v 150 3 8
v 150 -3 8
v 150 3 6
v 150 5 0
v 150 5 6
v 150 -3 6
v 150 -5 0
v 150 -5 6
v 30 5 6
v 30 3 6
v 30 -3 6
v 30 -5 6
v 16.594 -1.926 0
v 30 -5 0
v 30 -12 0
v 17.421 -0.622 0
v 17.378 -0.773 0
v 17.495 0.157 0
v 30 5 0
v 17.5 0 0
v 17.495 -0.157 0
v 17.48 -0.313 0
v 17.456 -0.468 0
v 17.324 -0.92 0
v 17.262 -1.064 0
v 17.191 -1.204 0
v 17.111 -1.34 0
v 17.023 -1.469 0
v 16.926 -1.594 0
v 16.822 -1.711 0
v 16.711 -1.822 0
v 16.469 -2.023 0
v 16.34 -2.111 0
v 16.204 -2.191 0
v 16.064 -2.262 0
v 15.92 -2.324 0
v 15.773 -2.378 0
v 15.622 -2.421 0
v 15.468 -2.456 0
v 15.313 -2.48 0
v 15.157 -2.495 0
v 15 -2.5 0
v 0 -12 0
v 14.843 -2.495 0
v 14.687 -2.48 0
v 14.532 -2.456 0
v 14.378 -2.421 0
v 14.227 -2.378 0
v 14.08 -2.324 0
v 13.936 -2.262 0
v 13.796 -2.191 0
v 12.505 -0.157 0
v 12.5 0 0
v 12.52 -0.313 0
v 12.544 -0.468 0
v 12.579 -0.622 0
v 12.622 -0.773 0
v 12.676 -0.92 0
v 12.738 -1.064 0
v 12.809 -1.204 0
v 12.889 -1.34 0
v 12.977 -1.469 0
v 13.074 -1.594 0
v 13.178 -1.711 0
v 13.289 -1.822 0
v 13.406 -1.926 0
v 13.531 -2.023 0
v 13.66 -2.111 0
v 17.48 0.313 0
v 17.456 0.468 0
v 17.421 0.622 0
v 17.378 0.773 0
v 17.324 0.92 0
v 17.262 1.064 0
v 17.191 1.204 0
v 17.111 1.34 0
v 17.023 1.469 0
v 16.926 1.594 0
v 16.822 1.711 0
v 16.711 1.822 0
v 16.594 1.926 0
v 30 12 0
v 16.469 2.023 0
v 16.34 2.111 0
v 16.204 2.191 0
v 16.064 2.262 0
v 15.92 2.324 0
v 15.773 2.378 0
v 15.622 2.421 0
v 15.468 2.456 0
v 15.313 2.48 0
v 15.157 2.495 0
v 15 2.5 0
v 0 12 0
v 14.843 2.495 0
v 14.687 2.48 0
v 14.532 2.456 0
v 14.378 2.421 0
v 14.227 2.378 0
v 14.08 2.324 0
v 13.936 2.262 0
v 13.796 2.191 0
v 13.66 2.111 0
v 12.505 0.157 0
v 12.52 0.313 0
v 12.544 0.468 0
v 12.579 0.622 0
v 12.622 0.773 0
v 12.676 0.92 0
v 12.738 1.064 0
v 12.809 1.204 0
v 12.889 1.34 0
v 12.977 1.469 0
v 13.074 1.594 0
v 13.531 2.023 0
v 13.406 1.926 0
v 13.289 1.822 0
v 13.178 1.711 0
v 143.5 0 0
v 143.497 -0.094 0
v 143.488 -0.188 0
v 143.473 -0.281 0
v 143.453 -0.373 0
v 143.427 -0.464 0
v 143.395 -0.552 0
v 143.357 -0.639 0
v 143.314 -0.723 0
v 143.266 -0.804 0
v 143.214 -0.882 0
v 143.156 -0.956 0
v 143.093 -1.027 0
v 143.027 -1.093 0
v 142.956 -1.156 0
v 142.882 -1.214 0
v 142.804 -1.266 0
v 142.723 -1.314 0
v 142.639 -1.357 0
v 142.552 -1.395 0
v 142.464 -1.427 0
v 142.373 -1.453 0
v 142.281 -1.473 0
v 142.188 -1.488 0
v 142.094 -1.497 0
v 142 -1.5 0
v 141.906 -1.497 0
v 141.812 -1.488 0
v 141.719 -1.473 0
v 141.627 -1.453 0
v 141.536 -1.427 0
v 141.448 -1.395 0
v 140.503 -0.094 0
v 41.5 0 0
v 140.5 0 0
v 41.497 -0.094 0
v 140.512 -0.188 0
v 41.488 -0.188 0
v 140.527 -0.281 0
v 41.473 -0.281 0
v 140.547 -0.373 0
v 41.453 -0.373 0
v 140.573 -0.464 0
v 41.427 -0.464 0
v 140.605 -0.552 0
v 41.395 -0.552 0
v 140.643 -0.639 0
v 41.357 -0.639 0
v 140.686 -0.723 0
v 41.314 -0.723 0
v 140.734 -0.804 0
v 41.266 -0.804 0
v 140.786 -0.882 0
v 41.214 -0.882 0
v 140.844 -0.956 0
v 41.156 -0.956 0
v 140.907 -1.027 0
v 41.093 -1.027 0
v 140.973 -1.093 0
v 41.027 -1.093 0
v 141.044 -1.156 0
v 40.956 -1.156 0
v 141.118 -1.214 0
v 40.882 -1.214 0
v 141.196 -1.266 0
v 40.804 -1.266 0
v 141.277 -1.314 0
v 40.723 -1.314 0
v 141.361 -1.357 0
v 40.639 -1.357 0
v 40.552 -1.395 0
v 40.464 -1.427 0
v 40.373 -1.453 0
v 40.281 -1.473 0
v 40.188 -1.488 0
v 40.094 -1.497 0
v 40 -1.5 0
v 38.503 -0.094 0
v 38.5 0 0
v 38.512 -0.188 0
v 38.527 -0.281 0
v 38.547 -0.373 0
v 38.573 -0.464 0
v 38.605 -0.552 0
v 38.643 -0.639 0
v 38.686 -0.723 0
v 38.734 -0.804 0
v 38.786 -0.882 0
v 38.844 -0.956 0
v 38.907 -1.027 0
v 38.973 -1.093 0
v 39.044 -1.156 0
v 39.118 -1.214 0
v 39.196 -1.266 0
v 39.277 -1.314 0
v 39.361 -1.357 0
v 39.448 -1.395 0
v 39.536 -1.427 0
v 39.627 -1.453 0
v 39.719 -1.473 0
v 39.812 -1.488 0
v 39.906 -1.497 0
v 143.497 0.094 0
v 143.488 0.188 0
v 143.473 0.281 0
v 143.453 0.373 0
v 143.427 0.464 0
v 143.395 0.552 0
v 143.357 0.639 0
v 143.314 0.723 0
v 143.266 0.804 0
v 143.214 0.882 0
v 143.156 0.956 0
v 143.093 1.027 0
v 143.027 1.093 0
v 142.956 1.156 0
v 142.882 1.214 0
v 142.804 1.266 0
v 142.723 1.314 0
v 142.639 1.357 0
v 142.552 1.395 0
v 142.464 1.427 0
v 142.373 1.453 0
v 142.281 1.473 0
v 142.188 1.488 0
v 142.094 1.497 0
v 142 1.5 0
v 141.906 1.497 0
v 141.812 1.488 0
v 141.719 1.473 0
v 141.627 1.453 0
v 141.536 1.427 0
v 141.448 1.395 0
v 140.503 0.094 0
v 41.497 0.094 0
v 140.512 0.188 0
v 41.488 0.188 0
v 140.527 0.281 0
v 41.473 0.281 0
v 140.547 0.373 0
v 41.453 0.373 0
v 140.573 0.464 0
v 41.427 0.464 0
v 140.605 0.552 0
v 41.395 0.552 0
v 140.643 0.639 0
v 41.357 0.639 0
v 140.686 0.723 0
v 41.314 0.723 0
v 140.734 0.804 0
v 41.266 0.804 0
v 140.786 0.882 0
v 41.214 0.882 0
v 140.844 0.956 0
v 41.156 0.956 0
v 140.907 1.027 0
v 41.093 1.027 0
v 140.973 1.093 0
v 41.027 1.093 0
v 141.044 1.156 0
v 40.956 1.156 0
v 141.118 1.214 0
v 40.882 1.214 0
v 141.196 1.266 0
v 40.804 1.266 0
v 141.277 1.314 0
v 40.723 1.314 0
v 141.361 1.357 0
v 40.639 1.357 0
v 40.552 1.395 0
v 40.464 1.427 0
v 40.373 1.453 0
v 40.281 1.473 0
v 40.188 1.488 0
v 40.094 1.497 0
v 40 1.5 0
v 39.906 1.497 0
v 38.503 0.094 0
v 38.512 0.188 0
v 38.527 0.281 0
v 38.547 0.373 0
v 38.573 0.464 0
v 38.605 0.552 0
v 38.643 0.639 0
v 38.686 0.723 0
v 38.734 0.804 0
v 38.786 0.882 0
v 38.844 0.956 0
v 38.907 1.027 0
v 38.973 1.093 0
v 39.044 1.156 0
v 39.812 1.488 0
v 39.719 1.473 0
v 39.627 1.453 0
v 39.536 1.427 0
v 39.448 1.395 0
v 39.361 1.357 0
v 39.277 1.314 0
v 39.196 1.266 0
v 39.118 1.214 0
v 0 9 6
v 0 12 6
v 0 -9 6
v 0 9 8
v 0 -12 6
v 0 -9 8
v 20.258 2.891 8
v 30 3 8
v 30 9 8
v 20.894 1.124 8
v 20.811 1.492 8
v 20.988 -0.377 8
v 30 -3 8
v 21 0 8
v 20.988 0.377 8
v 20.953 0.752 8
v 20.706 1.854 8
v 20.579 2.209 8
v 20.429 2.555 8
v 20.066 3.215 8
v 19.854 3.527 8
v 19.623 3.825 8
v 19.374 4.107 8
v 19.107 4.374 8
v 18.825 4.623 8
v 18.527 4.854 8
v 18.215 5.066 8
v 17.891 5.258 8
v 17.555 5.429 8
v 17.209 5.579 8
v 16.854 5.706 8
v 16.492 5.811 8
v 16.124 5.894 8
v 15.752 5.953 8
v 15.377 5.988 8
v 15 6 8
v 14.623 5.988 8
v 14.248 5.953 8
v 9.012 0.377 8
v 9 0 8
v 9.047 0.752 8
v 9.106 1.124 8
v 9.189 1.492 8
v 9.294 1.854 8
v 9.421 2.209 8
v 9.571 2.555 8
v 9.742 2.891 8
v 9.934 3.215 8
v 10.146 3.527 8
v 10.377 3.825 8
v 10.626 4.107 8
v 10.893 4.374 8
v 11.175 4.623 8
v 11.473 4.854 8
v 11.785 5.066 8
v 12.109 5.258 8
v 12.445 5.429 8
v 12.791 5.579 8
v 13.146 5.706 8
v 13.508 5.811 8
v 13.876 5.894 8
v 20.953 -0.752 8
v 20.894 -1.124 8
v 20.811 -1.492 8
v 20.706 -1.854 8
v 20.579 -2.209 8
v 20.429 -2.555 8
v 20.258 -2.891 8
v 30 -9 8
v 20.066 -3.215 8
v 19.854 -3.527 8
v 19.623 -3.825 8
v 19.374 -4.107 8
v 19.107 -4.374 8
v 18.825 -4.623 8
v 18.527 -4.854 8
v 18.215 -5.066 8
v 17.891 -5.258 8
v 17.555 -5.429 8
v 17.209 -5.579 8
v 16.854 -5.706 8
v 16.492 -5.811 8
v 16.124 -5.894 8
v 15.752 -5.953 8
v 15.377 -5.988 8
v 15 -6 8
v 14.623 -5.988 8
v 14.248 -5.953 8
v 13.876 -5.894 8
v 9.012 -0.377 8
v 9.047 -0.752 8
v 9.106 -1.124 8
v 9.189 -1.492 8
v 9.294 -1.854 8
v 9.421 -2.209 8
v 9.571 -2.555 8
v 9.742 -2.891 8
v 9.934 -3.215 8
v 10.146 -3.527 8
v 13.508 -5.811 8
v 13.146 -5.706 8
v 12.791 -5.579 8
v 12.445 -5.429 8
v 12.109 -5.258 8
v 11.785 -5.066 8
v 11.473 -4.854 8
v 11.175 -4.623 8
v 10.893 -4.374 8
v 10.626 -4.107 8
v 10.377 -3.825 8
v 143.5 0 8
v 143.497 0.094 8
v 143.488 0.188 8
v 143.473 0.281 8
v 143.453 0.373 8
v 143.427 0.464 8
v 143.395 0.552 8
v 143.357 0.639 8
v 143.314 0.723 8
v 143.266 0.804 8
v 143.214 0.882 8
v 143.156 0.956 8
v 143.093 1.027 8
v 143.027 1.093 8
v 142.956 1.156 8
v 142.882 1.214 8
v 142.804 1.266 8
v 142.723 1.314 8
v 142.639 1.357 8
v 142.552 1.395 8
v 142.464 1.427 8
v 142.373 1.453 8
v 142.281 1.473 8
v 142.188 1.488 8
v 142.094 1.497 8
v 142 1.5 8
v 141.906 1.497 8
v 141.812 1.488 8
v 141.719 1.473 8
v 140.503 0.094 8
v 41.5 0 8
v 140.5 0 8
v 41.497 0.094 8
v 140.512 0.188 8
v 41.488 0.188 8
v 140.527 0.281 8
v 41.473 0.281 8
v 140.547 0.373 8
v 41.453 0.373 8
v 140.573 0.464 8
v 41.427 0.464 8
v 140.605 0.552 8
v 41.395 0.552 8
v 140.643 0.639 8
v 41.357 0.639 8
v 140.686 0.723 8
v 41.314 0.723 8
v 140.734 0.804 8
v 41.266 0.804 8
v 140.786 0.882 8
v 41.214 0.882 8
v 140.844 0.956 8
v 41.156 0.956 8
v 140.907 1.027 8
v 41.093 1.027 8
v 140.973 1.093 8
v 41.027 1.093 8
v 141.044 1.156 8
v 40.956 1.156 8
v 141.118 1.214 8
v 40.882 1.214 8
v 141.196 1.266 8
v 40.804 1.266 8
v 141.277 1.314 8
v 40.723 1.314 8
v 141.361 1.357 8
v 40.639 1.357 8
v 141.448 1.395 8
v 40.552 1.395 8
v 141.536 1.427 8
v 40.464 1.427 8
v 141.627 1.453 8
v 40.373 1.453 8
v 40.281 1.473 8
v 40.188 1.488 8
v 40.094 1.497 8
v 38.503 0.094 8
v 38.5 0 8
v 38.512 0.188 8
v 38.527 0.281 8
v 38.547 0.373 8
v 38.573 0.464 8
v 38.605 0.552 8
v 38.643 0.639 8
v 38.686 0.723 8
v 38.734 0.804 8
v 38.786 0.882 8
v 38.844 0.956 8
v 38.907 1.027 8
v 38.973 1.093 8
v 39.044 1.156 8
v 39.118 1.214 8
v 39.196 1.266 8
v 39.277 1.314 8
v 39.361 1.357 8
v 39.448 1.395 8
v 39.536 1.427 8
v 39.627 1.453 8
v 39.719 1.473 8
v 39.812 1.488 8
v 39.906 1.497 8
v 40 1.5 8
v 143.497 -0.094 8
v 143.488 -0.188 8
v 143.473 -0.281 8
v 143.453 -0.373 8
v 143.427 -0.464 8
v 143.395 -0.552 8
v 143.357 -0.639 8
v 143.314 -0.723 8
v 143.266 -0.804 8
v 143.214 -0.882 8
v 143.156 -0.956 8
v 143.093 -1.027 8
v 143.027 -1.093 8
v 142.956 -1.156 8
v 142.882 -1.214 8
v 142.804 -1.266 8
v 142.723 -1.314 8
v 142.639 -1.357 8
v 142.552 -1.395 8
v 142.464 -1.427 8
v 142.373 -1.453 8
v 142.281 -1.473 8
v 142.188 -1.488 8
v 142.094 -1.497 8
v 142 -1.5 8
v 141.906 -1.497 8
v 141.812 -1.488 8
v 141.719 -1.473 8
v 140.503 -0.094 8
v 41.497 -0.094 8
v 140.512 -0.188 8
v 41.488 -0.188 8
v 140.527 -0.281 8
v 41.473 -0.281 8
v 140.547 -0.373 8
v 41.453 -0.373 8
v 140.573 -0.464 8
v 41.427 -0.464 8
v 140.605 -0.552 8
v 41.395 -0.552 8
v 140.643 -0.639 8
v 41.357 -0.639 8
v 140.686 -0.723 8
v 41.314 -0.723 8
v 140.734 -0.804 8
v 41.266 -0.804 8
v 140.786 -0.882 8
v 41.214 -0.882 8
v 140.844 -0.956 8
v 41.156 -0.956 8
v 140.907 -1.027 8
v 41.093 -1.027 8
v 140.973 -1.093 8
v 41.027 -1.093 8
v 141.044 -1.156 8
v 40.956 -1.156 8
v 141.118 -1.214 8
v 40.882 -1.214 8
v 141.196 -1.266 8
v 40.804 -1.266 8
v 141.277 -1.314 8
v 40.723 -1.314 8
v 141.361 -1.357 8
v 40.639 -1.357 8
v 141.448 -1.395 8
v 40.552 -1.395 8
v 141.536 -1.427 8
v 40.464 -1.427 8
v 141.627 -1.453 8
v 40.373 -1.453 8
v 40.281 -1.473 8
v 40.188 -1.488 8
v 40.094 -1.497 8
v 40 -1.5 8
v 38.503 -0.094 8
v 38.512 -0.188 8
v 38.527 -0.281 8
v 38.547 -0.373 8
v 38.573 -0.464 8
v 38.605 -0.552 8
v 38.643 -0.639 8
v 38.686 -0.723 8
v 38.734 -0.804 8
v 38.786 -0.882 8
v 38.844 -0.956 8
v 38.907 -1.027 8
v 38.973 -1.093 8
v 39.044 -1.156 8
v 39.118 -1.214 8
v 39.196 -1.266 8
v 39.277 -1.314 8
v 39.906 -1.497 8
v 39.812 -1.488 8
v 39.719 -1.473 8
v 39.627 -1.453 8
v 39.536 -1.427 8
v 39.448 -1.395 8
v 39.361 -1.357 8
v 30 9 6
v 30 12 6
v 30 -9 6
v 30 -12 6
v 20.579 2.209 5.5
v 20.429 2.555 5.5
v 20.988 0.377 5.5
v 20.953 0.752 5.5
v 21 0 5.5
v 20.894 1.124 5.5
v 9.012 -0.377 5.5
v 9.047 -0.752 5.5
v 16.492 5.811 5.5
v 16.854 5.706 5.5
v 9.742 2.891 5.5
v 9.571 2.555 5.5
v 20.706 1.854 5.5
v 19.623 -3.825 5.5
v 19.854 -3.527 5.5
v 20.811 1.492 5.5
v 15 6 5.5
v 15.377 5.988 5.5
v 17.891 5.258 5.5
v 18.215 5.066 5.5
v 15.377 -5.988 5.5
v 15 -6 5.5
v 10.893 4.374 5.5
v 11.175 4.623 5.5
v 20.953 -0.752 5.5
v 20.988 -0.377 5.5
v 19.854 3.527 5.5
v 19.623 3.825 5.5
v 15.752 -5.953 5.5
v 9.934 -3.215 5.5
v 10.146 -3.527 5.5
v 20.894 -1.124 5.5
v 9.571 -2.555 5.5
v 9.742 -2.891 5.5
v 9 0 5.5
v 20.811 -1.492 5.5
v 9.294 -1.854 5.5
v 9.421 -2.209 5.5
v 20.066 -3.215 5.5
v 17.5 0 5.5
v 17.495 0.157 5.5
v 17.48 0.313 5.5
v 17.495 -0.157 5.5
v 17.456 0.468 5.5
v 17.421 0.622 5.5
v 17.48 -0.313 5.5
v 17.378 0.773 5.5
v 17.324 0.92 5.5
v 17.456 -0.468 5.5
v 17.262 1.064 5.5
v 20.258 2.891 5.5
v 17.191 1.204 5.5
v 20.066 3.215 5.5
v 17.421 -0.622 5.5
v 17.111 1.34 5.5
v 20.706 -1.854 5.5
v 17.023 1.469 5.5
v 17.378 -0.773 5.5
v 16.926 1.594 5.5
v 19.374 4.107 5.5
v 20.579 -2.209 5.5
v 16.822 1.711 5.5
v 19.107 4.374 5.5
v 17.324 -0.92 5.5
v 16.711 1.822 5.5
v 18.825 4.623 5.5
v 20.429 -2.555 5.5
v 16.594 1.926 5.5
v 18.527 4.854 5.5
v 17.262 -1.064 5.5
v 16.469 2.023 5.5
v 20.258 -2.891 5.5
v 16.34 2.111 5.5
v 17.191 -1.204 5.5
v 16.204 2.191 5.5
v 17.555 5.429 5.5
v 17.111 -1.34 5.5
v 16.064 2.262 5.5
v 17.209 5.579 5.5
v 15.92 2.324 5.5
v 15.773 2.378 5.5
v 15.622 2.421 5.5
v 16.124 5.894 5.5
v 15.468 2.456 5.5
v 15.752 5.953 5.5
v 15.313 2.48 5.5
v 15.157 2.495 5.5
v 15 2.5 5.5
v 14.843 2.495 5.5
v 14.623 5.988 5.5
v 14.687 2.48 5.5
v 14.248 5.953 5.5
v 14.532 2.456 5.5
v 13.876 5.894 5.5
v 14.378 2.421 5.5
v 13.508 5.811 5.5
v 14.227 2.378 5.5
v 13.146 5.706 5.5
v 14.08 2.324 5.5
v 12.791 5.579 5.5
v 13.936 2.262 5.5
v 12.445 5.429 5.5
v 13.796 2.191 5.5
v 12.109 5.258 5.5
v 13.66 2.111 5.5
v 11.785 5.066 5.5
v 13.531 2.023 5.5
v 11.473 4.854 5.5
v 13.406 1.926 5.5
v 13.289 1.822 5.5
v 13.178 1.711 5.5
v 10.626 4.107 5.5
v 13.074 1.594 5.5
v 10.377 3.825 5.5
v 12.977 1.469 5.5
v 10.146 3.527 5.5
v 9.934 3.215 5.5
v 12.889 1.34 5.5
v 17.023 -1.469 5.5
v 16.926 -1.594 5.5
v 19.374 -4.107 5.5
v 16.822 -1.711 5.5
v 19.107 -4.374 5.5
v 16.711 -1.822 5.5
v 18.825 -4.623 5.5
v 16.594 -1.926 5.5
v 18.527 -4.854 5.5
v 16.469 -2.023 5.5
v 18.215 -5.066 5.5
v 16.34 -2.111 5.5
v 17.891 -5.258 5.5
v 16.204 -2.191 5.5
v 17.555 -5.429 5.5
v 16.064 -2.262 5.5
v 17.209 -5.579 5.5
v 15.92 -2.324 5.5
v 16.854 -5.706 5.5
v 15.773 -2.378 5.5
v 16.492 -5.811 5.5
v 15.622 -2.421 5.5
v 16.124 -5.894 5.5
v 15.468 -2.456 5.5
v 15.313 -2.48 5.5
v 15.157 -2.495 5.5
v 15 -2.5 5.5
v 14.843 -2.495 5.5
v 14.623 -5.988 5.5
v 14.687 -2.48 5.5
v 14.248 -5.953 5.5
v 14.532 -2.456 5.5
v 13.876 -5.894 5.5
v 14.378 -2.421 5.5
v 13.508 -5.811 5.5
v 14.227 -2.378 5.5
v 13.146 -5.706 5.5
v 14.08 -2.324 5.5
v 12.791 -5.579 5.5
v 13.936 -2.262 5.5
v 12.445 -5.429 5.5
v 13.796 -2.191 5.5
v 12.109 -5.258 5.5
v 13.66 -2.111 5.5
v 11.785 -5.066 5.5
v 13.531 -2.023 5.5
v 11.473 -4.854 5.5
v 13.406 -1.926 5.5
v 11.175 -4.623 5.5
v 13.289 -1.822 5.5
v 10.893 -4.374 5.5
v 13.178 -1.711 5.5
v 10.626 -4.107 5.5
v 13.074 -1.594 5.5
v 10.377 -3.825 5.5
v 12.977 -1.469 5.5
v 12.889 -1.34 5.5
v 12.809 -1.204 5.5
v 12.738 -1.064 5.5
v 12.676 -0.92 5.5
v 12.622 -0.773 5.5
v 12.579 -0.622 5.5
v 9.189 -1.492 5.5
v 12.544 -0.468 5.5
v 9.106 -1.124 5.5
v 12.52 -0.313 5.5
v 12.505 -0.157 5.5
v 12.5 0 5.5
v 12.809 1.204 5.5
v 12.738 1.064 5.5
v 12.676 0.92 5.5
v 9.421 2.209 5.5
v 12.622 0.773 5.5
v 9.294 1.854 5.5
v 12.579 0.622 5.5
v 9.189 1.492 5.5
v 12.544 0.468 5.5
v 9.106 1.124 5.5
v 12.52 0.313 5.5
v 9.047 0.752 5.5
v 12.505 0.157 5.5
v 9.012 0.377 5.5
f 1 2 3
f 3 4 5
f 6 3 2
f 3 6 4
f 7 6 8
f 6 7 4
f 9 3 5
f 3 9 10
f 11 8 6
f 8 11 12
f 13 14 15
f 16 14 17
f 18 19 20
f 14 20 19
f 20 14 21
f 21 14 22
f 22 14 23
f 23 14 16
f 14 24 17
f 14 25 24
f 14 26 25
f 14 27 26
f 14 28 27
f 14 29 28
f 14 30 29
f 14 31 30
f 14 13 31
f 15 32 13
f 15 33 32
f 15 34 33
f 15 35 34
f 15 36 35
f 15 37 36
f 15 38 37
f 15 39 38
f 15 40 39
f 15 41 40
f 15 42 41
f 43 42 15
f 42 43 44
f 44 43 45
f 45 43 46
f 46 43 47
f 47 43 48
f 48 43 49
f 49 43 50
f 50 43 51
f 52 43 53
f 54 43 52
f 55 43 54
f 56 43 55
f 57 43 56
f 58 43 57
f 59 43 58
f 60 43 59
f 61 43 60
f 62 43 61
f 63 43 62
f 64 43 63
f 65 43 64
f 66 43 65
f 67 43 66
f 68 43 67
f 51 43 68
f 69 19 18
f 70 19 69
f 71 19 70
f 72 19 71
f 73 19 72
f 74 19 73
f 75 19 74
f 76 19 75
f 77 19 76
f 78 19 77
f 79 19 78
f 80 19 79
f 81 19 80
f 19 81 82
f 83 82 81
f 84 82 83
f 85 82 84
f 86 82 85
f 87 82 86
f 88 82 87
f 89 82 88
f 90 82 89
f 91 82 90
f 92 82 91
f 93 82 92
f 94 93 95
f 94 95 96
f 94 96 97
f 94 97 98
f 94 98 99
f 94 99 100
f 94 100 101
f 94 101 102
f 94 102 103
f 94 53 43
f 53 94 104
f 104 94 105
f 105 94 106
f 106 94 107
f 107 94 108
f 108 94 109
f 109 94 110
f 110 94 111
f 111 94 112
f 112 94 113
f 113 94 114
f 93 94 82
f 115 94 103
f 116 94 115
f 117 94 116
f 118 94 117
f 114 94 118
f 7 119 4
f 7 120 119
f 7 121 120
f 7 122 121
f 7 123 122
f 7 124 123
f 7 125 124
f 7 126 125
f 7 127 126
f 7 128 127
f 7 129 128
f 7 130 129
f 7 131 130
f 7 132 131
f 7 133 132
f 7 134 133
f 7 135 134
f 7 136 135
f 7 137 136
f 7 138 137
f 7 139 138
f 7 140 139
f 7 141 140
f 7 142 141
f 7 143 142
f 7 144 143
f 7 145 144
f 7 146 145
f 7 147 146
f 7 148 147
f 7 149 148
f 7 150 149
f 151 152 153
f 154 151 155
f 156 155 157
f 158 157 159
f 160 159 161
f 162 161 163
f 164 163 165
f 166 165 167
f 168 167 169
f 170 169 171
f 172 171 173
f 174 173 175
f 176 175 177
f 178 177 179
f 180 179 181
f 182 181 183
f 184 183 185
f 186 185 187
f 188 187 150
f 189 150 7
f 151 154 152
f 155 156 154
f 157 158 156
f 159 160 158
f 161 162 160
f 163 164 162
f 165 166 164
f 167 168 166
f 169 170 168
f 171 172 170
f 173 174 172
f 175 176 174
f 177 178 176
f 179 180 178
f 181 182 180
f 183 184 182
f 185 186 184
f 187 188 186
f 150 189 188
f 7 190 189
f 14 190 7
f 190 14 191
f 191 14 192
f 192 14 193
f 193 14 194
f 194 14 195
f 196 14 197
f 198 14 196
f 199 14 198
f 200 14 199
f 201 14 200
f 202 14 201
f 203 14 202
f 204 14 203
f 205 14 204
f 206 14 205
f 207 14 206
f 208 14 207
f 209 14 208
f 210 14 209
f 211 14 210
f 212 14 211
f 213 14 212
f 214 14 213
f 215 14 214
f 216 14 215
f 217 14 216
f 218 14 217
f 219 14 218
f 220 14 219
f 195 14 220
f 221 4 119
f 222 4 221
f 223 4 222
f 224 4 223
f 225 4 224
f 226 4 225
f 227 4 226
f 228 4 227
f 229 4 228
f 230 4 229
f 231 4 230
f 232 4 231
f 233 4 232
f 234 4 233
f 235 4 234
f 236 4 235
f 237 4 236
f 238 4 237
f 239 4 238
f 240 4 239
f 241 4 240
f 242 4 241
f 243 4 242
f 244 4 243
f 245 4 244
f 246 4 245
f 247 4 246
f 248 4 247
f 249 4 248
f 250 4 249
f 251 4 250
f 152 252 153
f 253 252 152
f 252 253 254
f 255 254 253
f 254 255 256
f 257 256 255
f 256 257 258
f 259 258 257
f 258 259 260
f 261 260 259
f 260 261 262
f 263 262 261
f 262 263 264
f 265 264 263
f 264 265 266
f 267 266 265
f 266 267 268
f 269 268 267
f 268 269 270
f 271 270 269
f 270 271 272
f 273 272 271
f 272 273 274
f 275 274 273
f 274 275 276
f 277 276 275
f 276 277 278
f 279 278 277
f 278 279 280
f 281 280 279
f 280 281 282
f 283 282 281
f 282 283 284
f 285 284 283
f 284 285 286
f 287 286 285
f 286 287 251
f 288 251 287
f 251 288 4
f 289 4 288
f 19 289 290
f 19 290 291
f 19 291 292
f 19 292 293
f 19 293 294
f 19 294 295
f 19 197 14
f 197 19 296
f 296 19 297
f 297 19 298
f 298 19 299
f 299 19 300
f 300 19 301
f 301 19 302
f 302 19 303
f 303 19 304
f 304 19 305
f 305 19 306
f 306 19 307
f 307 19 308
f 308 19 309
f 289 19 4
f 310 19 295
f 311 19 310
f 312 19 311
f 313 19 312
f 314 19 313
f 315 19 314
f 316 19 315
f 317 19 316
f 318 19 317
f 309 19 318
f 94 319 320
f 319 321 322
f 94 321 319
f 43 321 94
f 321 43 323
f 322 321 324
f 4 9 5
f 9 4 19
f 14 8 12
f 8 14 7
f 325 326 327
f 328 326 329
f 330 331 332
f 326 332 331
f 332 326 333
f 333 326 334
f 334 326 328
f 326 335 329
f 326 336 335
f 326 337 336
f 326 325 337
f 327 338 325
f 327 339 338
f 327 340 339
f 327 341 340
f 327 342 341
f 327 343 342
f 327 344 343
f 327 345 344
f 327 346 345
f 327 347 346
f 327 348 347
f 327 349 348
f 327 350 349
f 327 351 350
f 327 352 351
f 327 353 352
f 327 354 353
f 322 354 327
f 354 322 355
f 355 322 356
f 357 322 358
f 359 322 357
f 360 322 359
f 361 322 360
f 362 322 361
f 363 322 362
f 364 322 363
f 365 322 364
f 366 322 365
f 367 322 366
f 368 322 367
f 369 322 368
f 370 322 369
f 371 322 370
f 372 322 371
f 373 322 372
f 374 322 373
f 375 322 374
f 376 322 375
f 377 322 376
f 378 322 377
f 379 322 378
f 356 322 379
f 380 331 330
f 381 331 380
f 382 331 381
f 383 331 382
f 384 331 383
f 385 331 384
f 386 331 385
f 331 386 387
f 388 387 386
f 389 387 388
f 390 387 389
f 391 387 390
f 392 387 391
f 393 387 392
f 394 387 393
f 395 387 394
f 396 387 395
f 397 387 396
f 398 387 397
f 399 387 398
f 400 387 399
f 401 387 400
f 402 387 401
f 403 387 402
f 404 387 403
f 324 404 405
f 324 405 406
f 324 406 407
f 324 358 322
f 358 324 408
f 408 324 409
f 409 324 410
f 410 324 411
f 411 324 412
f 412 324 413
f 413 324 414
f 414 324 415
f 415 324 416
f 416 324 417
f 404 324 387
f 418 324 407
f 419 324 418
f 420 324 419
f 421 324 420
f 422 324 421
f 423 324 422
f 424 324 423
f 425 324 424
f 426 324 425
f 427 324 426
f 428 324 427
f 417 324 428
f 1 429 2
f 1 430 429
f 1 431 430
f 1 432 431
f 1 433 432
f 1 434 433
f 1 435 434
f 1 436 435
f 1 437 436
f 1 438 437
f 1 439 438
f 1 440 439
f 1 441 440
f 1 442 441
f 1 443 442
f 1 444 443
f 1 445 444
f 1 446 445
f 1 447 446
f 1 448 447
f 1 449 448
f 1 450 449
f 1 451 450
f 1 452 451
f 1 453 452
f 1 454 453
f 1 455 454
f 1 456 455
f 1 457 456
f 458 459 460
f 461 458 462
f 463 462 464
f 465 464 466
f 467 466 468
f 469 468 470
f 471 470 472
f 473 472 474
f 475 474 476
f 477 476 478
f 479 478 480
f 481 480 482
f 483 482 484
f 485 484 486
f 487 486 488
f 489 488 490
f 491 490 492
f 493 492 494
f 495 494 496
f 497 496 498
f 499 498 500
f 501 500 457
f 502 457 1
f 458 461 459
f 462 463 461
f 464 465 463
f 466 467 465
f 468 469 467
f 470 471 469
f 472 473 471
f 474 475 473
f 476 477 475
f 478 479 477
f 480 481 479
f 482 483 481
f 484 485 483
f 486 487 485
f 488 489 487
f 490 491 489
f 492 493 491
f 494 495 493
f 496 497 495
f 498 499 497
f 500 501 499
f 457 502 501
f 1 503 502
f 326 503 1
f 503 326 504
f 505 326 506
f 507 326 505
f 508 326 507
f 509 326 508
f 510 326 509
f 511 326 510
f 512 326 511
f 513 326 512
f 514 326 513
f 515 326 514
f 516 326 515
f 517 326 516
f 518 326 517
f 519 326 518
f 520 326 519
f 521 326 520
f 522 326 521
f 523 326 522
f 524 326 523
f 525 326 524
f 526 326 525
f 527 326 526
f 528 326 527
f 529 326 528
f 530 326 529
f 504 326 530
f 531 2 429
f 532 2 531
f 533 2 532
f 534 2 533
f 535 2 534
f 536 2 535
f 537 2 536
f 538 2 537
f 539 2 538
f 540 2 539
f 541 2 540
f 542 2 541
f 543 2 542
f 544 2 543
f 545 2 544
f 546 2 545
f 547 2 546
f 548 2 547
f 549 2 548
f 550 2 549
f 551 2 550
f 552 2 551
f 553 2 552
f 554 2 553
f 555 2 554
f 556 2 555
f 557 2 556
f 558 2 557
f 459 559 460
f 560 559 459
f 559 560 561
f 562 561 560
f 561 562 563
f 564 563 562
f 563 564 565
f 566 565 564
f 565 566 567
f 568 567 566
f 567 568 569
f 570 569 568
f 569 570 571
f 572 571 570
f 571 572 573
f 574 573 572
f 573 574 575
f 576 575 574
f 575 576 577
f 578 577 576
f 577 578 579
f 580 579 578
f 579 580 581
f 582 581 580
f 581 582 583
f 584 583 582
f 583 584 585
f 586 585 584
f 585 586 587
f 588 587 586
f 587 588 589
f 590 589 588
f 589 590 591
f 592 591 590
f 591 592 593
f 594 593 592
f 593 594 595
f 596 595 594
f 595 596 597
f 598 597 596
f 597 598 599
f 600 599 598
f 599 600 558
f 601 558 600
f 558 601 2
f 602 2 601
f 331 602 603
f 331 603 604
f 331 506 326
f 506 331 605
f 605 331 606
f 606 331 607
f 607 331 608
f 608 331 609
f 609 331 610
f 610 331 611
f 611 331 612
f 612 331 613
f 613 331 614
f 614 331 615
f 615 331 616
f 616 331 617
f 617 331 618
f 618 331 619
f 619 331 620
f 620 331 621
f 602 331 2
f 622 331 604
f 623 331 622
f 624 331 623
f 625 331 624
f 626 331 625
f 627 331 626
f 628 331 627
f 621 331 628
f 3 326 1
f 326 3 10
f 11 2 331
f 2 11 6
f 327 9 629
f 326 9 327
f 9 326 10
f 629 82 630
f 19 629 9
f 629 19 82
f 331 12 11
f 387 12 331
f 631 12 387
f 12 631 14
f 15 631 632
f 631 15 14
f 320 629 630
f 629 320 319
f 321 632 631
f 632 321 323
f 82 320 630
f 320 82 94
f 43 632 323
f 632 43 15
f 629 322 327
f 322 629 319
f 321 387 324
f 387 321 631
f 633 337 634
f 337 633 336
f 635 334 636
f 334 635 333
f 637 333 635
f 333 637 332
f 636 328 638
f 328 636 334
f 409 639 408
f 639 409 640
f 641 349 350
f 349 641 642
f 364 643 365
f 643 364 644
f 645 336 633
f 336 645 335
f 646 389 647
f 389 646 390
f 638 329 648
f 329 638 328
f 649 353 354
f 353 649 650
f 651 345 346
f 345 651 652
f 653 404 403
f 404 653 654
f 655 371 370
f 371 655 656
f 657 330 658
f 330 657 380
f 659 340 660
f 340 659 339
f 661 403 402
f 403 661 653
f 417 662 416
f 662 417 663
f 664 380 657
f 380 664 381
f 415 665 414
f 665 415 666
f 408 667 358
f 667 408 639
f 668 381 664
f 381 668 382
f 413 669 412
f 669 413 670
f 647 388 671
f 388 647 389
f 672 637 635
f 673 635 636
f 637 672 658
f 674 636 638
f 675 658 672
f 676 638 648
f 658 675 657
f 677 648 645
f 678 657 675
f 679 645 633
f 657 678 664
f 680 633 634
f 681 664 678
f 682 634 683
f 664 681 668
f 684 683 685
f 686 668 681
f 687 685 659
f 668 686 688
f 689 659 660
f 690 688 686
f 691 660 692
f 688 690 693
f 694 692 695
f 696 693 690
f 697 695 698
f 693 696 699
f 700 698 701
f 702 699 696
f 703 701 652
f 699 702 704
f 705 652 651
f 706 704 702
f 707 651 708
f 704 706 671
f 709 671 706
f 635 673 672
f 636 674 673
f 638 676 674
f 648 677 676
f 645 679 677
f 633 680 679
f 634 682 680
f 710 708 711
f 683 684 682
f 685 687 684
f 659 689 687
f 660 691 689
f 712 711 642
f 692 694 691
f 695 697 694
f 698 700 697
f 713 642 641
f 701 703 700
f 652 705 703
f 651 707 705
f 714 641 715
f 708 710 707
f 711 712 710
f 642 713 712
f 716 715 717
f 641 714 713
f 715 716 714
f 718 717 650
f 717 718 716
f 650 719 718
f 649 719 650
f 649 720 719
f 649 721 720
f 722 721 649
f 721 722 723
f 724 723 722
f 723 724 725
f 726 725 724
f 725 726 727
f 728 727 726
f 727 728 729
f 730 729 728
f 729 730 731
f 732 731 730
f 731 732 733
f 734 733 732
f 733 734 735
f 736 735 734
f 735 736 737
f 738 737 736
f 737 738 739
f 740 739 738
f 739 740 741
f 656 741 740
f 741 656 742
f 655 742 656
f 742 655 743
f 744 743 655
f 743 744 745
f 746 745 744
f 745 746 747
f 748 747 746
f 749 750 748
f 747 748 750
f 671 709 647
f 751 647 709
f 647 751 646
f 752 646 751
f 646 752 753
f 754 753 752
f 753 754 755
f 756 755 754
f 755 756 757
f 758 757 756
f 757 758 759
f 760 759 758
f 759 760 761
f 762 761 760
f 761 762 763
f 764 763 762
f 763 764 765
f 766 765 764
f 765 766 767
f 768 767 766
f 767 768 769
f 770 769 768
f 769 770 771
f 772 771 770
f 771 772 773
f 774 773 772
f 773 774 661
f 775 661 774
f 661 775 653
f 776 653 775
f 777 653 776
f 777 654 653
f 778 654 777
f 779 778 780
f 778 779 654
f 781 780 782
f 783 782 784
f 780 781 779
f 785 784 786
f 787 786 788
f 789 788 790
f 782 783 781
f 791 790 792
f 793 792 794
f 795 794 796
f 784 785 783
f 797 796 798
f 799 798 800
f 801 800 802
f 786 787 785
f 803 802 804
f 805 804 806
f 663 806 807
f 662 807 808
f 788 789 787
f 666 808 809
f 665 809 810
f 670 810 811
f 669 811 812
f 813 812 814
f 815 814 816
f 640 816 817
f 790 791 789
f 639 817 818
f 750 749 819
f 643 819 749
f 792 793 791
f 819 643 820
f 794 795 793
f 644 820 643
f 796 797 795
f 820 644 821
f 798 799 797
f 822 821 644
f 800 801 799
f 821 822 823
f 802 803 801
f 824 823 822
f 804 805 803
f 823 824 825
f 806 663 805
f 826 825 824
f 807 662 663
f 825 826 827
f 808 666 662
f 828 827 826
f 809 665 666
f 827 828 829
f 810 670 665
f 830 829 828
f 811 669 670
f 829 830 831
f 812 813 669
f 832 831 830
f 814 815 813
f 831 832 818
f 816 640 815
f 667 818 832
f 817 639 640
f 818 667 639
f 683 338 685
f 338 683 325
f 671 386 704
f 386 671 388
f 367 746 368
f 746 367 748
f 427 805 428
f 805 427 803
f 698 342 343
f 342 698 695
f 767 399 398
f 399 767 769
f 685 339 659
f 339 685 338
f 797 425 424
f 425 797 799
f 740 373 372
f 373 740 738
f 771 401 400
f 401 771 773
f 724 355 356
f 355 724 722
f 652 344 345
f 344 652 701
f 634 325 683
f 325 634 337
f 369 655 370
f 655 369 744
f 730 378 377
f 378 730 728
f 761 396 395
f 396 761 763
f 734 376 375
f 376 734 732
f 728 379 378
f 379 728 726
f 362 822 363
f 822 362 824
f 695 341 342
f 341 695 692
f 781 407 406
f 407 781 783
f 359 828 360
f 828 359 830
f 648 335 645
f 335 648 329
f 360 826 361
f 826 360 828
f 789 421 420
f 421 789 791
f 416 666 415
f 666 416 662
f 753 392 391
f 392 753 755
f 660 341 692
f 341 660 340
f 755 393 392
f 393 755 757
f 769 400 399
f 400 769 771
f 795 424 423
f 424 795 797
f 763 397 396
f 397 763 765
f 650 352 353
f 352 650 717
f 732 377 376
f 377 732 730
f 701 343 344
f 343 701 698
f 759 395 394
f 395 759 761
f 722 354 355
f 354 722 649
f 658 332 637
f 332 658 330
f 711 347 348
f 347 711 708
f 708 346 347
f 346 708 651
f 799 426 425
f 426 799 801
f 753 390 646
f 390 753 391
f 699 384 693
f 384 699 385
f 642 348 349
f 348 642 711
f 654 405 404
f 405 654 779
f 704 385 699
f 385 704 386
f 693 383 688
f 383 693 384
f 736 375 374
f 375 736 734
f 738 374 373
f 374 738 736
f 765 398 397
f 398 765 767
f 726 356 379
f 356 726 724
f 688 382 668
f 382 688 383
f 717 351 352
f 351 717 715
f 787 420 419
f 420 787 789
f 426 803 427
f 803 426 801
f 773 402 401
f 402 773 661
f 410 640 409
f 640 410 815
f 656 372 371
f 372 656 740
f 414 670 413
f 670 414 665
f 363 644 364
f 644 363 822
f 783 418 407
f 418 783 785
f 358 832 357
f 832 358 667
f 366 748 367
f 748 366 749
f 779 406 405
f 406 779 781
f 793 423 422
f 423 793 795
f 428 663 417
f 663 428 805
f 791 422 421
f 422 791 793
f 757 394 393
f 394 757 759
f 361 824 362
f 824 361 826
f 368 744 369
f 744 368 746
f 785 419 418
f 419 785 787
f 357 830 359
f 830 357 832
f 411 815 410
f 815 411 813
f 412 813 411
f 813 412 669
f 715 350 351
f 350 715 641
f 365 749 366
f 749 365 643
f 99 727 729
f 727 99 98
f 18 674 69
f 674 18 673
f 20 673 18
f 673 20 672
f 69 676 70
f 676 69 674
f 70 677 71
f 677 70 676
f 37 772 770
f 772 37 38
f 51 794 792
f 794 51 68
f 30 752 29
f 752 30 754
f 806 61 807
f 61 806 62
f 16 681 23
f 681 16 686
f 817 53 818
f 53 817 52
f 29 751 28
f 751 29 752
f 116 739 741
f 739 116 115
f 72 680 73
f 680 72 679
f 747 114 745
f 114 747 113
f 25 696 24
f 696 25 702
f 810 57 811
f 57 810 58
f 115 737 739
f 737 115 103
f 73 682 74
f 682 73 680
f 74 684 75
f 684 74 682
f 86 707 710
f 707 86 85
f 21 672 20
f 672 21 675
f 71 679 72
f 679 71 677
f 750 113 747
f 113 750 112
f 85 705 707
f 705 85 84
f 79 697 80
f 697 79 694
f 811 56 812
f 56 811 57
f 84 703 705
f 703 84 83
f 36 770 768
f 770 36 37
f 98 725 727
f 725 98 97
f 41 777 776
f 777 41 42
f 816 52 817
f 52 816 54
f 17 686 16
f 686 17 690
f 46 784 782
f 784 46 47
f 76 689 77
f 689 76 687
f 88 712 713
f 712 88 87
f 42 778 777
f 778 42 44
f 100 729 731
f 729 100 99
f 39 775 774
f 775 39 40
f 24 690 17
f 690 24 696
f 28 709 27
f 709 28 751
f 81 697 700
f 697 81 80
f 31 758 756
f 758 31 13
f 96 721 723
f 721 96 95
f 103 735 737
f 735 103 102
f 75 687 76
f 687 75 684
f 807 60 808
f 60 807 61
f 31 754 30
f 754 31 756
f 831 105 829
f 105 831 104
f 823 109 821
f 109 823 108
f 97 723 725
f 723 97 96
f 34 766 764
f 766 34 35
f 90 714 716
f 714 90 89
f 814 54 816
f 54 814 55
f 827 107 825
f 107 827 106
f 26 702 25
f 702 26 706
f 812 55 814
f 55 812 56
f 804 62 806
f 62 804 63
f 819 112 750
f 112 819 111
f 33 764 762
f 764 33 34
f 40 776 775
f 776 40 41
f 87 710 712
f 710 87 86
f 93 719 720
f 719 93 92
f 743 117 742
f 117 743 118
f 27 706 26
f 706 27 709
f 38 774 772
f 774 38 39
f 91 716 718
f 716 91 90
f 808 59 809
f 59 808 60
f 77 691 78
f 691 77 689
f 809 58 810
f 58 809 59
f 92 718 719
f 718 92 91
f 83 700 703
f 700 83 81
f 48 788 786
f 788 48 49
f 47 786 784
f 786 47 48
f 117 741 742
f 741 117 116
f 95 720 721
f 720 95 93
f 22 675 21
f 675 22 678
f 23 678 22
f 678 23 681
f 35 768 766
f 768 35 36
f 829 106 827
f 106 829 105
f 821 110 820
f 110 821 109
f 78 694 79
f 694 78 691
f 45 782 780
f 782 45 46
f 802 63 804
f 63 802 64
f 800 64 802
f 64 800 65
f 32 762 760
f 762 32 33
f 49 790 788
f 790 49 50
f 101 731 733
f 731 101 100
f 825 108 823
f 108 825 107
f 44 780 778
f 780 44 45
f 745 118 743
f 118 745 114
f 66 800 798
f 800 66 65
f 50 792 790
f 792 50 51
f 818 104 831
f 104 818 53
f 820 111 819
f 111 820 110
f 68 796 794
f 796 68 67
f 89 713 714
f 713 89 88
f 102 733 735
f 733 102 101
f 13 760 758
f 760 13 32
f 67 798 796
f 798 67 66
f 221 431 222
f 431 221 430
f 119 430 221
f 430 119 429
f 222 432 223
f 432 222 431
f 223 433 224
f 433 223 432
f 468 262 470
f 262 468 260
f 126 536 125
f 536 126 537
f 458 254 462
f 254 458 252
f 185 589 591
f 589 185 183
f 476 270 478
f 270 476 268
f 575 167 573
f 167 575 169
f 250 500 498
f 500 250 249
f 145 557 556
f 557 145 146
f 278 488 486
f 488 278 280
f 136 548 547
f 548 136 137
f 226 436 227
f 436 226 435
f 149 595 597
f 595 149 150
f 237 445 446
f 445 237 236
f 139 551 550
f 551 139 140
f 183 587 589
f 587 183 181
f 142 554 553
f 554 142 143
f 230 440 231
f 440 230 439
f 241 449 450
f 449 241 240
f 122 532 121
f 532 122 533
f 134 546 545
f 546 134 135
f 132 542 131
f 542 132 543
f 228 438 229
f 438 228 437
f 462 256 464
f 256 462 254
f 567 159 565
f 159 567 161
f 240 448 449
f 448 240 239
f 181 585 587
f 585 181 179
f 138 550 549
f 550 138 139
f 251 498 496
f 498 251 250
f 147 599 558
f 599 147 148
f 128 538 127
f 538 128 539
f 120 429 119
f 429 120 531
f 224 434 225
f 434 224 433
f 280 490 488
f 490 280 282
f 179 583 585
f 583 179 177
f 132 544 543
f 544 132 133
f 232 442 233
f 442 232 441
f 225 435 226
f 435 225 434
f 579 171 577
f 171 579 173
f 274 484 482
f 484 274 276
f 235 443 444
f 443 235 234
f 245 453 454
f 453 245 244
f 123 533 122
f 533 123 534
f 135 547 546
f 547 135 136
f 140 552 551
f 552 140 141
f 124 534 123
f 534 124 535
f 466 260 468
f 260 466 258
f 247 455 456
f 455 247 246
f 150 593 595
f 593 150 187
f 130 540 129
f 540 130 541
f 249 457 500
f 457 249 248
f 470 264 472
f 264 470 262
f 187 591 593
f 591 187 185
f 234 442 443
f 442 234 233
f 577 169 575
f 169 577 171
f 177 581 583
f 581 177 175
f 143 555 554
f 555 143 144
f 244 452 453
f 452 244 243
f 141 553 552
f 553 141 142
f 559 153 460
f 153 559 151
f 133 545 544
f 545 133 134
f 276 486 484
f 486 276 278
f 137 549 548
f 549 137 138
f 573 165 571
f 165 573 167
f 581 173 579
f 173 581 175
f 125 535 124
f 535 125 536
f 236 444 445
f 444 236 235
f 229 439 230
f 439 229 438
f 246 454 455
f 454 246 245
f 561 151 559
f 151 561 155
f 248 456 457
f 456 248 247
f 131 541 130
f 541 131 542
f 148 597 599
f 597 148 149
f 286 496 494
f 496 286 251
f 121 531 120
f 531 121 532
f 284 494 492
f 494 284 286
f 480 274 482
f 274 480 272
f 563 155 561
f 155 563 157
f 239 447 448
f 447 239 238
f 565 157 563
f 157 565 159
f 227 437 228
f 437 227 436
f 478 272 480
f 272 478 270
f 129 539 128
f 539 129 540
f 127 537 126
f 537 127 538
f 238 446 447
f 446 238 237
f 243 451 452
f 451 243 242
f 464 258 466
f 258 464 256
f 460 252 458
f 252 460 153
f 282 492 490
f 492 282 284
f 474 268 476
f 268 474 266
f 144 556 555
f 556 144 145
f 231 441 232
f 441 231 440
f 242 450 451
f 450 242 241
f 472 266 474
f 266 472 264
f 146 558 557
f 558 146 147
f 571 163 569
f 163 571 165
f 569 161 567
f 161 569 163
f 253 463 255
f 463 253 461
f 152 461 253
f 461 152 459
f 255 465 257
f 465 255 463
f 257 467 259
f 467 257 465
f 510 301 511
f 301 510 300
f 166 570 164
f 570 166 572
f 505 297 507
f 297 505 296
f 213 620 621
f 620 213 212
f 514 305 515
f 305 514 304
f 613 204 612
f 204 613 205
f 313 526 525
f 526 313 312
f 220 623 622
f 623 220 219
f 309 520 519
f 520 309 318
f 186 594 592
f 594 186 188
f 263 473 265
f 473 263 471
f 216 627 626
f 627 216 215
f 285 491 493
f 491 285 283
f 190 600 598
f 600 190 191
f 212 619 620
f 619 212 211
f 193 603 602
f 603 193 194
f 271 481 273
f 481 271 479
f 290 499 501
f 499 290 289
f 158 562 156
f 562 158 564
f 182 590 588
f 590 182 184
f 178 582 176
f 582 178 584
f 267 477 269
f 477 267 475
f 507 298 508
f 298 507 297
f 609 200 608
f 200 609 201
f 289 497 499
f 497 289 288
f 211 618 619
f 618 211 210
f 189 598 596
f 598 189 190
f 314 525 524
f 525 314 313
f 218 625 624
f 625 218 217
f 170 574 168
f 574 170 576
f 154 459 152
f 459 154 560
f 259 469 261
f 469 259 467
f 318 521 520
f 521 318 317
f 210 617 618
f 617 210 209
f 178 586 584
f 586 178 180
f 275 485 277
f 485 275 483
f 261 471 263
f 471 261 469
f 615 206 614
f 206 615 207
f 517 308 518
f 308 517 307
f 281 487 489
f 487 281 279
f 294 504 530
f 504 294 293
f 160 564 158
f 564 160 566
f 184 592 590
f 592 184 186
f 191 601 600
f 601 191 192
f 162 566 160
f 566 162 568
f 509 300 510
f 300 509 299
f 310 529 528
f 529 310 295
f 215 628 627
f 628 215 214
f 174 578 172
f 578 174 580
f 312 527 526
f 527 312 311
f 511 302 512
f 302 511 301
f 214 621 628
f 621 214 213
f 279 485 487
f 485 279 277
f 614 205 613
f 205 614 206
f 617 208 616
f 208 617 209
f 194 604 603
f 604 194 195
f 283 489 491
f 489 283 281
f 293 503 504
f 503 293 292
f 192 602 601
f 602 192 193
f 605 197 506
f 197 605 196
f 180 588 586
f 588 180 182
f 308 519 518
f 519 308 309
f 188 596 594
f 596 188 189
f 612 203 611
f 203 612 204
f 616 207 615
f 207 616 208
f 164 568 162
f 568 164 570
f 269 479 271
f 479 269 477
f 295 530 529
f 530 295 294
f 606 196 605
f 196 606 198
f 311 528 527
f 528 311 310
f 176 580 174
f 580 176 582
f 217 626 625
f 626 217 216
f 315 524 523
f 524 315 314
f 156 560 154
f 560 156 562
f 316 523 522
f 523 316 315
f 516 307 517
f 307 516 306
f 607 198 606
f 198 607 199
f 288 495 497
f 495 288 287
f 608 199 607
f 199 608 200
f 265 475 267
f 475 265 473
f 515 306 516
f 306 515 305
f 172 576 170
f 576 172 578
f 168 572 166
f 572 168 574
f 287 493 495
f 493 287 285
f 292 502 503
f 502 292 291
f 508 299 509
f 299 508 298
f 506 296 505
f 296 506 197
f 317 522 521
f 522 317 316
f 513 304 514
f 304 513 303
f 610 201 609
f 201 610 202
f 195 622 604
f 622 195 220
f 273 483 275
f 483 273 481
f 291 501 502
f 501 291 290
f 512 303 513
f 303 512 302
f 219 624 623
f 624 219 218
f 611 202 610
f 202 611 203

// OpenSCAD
// ==========================================
// Parametric Variables
// ==========================================

// Resolution for curved surfaces
$fn = 100;

// Base Rail Dimensions
rail_length = 150;
rail_width = 10;
rail_base_height = 6;

// Top Layer Dimensions (shallow, full-length)
top_layer_width = 6;
top_layer_height = 2;

// Extension Block Dimensions (wider, at one end)
ext_length = 30;
ext_width = 24;
ext_top_width = 18;

// Rail Removed Features (Small circular cuts)
rail_hole_dia = 3;
rail_hole_1_pos = 142; // Positioned near the far end
rail_hole_2_pos = 40;  // Positioned near the extension end

// Extension Removed Features (Stepped depth cutouts)
ext_recess_dia = 12;
ext_recess_depth = 2.5; // Creates a shallow recess through top layer
ext_deep_cutout_dia = 5; // Deeper cutout through the lower body

// ==========================================
// Reusable Modules
// ==========================================

// Module: stepped_block
// Creates a rectangular body with a base layer and a centered shallow top layer
module stepped_block(length, base_w, base_h, top_w, top_h) {
    union() {
        // Lower body (base layer)
        translate([0, -base_w/2, 0])
            cube([length, base_w, base_h]);
        
        // Upper body (shallow top layer)
        translate([0, -top_w/2, base_h])
            cube([length, top_w, top_h]);
    }
}

// Module: stepped_hole
// Creates a compound cylindrical negative volume for counterbored/stepped cuts
module stepped_hole(recess_d, recess_depth, deep_d, total_depth, top_z) {
    union() {
        // Shallow circular recess (oversized slightly in Z for clean cuts)
        translate([0, 0, top_z - recess_depth])
            cylinder(h = recess_depth + 1, d = recess_d);
        
        // Much deeper cutout (through hole, extending below Z=0)
        translate([0, 0, -1])
            cylinder(h = total_depth + 2, d = deep_d);
    }
}

// ==========================================
// Main Model Assembly
// ==========================================

difference() {
    // 1. Positive Geometry: Union of the long rail and the wider extension block
    union() {
        // Long slim rectangular rail with shallow top layer
        stepped_block(
            length = rail_length,
            base_w = rail_width,
            base_h = rail_base_height,
            top_w = top_layer_width,
            top_h = top_layer_height
        );

        // Wider block-like extension at one end with matching top layer
        stepped_block(
            length = ext_length,
            base_w = ext_width,
            base_h = rail_base_height,
            top_w = ext_top_width,
            top_h = top_layer_height
        );
    }

    // 2. Negative Geometry: Subtractive features and cutouts

    // Small circular removed feature near the far end of the rail
    translate([rail_hole_1_pos, 0, -1])
        cylinder(h = rail_base_height + top_layer_height + 2, d = rail_hole_dia);

    // Small circular removed feature near the extension end of the rail
    translate([rail_hole_2_pos, 0, -1])
        cylinder(h = rail_base_height + top_layer_height + 2, d = rail_hole_dia);

    // Extension end detailing: shallow recess and a much deeper cutout
    // Centered within the extension block
    translate([ext_length / 2, 0, 0])
        stepped_hole(
            recess_d = ext_recess_dia,
            recess_depth = ext_recess_depth,
            deep_d = ext_deep_cutout_dia,
            total_depth = rail_base_height + top_layer_height,
            top_z = rail_base_height + top_layer_height
        );
}
